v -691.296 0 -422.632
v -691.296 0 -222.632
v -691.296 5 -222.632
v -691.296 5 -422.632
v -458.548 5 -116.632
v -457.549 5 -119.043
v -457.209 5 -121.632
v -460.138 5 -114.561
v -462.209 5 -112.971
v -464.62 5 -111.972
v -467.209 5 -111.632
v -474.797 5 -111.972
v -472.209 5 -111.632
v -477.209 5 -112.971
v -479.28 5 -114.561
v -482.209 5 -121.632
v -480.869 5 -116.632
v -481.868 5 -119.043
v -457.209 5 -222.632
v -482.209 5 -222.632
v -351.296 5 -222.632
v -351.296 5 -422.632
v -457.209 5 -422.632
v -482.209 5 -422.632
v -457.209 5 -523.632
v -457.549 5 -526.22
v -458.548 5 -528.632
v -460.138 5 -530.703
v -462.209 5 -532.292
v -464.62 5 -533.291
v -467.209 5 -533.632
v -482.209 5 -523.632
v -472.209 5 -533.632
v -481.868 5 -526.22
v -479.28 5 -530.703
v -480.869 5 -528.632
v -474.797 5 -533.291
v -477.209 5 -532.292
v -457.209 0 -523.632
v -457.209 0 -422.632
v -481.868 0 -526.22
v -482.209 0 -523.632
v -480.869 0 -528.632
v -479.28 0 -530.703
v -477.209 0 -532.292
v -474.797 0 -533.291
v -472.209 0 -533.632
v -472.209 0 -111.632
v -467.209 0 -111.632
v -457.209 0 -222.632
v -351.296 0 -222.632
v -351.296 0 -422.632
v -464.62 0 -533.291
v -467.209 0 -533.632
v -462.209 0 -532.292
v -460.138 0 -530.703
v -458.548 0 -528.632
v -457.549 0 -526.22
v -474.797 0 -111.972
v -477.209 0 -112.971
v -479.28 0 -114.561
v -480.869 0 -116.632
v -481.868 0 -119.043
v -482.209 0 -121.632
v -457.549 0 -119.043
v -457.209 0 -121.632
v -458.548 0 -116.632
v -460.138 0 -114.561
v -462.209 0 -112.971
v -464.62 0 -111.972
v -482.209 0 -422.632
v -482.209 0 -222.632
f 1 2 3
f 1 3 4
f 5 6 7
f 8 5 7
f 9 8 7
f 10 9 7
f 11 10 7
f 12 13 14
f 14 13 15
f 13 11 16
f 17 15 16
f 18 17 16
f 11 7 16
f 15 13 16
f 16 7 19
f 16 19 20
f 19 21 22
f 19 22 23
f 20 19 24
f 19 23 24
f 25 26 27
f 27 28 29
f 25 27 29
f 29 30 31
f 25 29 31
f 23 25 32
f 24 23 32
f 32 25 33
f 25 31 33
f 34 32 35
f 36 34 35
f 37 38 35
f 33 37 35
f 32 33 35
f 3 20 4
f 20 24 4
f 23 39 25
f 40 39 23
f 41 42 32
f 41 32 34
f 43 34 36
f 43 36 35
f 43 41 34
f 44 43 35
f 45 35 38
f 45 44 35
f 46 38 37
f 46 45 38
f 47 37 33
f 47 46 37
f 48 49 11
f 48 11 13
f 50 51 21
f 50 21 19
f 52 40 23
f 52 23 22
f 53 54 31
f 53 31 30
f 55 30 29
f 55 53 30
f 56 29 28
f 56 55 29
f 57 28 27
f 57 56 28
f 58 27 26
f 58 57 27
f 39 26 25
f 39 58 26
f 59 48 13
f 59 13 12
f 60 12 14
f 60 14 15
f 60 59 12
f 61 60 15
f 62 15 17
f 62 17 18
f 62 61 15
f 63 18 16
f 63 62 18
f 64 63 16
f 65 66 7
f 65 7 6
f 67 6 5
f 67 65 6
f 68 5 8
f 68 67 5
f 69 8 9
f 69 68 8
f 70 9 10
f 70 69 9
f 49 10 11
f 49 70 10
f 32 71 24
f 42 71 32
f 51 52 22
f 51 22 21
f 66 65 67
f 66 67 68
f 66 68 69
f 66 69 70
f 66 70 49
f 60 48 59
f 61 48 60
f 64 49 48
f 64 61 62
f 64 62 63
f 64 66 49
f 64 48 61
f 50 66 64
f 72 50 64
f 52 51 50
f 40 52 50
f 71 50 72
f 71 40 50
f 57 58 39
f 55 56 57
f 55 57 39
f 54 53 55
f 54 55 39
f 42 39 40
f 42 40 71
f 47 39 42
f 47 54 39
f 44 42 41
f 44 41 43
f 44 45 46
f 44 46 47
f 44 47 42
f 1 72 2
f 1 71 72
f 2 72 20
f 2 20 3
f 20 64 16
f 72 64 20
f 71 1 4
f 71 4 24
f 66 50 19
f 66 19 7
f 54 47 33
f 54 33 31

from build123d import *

# Parameters (mm, degrees)
BOSS_EXTRUDE1_DEPTH = 5


with BuildPart() as part:
    # Sketch1 → Boss-Extrude1 (new body)
    with BuildSketch(Plane(origin=(0, 0, 0), x_dir=(1, 0, 0), z_dir=(0, 1, 0))):
        with BuildLine():
            Line((-457.208642176, 422.631578947), (-351.296475424, 422.631578947))
            Line((-351.296475424, 422.631578947), (-351.296475424, 222.631578947))
            Line((-351.296475424, 222.631578947), (-457.208642176, 222.631578947))
            Line((-457.208642176, 222.631578947), (-457.208642176, 121.631578947))
            ThreePointArc((-457.208642176, 121.631578947), (-460.137574364, 114.560511136), (-467.208642176, 111.631578947))
            Line((-467.208642176, 111.631578947), (-472.208642176, 111.631578947))
            ThreePointArc((-472.208642176, 111.631578947), (-479.279709988, 114.560511136), (-482.208642176, 121.631578947))
            Line((-482.208642176, 121.631578947), (-482.208642176, 222.631578947))
            Line((-482.208642176, 222.631578947), (-691.296475424, 222.631578947))
            Line((-691.296475424, 222.631578947), (-691.296475424, 422.631578947))
            Line((-691.296475424, 422.631578947), (-482.208642176, 422.631578947))
            Line((-482.208642176, 422.631578947), (-482.208642176, 523.631578947))
            ThreePointArc((-482.208642176, 523.631578947), (-479.279709988, 530.702646759), (-472.208642176, 533.631578947))
            Line((-472.208642176, 533.631578947), (-467.208642176, 533.631578947))
            ThreePointArc((-467.208642176, 533.631578947), (-460.137574364, 530.702646759), (-457.208642176, 523.631578947))
            Line((-457.208642176, 523.631578947), (-457.208642176, 422.631578947))
        make_face()
    extrude(amount=BOSS_EXTRUDE1_DEPTH)


solid = part.part
